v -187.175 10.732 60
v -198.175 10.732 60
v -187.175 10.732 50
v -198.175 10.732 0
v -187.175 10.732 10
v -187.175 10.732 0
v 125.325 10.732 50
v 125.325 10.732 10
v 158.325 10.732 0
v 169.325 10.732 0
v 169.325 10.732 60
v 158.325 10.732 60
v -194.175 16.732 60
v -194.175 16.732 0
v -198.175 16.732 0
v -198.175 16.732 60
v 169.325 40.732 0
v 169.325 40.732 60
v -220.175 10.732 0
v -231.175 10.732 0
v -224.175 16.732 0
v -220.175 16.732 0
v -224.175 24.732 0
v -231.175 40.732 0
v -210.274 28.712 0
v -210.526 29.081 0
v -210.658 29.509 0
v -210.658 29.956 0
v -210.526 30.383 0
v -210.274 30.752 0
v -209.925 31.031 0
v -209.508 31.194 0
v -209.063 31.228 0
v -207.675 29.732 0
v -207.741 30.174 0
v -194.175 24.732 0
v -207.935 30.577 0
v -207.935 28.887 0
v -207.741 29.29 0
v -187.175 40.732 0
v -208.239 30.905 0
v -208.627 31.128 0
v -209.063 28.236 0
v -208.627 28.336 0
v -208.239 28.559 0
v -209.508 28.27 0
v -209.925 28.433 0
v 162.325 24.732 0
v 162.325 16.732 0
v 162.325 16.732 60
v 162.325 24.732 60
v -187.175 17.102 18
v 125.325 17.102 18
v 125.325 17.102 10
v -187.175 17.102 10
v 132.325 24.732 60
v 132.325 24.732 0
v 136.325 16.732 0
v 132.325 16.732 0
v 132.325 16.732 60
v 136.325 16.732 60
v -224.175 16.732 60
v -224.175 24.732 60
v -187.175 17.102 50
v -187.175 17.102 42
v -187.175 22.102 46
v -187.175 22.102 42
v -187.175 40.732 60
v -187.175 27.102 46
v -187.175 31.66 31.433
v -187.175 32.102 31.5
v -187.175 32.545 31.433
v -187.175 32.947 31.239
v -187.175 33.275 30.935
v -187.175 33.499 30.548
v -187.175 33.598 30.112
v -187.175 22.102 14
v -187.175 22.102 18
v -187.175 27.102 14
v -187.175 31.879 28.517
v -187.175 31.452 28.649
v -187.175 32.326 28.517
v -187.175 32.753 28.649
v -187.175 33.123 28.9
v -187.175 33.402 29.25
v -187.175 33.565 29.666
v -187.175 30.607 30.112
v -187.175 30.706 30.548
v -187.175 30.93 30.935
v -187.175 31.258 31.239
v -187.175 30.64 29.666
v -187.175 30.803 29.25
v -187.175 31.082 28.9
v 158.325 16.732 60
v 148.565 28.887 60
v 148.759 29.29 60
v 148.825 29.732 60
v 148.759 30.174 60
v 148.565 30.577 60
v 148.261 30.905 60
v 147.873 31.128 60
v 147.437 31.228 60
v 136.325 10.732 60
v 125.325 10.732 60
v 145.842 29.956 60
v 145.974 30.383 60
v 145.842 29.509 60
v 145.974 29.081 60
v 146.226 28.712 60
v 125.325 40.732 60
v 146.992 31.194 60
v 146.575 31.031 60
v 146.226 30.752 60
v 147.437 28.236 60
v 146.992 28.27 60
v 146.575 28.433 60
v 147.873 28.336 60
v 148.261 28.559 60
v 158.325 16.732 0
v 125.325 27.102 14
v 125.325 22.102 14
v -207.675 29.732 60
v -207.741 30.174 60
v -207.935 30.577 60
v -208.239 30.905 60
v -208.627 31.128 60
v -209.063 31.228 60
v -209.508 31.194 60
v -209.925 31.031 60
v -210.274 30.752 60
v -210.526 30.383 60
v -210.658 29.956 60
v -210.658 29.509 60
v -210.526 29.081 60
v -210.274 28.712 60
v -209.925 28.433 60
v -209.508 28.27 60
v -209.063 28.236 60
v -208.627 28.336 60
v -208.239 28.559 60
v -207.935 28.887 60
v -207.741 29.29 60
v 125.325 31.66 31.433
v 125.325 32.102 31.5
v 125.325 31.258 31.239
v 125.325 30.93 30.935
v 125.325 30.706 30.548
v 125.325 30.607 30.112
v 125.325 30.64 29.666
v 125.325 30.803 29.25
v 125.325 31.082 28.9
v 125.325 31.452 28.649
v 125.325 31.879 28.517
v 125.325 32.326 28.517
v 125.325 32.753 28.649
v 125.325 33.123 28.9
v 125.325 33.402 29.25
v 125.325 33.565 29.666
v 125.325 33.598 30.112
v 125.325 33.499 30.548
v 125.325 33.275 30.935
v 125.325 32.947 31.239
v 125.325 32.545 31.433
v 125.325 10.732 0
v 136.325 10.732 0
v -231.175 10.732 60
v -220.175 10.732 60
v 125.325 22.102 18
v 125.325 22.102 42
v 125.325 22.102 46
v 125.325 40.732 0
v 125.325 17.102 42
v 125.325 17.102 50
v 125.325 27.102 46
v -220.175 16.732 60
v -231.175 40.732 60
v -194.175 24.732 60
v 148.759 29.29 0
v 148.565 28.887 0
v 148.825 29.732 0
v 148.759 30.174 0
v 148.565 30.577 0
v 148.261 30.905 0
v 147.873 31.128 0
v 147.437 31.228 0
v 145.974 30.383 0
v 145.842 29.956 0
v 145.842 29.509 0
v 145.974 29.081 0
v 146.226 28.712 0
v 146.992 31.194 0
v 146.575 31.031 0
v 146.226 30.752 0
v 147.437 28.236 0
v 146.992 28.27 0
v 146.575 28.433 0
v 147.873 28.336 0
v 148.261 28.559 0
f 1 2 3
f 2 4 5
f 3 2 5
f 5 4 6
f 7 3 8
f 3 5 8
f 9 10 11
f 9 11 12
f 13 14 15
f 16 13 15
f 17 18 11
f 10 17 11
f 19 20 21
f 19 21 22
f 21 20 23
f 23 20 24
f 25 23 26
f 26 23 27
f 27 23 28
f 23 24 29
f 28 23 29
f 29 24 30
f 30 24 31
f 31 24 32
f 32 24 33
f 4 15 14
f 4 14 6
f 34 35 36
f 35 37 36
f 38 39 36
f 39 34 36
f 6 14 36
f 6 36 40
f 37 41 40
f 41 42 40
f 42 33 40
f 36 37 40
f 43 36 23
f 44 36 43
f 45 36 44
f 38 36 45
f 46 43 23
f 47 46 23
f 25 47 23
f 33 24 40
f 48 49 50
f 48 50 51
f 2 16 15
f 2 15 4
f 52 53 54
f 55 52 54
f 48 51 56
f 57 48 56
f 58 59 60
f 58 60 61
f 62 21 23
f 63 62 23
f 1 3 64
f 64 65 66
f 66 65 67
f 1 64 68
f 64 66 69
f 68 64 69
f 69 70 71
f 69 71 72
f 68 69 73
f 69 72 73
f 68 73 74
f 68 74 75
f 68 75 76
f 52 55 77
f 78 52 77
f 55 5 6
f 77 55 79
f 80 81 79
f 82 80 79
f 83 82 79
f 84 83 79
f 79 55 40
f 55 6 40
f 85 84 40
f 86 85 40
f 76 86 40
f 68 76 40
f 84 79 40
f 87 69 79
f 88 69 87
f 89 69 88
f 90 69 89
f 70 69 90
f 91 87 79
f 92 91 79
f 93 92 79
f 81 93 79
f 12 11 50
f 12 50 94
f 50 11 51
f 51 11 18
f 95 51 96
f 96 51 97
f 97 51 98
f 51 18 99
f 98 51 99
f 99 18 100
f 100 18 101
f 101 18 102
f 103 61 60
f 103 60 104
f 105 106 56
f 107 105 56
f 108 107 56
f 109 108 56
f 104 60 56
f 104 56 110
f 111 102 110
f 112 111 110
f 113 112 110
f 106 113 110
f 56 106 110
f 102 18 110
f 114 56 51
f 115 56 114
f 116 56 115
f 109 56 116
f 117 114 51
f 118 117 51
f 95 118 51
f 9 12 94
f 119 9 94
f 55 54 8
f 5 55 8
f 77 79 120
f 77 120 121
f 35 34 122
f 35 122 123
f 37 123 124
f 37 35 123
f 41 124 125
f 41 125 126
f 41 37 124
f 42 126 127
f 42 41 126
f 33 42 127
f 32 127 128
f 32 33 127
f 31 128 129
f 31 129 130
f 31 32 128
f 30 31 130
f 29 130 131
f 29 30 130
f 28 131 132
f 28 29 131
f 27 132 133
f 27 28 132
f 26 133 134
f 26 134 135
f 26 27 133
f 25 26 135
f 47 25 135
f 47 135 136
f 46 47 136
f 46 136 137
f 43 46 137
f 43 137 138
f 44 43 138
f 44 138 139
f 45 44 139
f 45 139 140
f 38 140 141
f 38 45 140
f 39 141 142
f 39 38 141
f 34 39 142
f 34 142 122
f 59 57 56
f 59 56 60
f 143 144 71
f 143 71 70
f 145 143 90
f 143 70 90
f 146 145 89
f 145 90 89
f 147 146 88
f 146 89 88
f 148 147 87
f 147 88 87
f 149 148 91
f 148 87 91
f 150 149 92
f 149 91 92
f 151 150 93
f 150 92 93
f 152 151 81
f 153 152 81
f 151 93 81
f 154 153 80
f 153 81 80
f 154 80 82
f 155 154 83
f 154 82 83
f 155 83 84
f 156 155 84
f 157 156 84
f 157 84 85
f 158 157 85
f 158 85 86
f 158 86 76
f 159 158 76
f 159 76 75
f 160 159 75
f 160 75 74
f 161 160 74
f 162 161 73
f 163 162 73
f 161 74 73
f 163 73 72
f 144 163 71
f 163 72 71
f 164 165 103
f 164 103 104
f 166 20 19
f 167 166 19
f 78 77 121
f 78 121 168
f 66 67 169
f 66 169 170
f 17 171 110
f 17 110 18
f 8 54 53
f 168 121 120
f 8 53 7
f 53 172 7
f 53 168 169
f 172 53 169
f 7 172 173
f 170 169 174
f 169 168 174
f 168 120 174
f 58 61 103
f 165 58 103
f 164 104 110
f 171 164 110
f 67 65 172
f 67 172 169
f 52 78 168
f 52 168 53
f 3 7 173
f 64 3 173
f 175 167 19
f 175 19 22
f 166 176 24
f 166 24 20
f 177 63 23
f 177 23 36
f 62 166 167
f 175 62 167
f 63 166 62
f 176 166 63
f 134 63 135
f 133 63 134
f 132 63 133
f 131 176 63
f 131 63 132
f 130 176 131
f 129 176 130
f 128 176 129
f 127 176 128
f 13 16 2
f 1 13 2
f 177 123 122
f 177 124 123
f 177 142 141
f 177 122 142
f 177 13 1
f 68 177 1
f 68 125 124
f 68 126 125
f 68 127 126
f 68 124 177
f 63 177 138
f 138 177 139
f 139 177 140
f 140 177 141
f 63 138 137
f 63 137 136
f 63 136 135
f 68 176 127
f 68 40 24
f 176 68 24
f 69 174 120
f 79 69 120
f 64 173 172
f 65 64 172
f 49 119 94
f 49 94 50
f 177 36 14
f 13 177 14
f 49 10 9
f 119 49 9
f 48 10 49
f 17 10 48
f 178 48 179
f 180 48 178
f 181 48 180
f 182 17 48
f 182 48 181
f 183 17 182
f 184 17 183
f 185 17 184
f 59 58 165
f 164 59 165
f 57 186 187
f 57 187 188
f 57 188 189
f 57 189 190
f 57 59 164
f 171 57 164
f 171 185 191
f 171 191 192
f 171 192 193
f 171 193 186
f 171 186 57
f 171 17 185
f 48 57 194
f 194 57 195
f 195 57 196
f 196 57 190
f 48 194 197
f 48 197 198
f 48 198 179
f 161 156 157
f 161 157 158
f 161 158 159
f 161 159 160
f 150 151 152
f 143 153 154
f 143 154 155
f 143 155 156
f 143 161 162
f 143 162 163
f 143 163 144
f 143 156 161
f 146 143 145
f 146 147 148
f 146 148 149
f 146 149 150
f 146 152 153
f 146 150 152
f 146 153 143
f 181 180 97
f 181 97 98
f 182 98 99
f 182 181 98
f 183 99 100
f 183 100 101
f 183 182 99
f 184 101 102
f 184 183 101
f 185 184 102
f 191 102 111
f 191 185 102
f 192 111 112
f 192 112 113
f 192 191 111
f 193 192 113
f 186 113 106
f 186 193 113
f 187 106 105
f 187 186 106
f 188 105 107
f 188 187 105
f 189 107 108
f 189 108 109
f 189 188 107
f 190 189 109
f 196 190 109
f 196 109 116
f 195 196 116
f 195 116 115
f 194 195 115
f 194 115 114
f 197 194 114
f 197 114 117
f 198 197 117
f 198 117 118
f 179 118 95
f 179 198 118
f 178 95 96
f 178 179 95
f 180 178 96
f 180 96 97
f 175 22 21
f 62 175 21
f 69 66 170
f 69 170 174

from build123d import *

# Parameters (mm, degrees)
SKETCH_1_R        = 1.5
EXTRUDE_1_DEPTH   = 60
EXTRUDE_1_2_DEPTH = 60
SKETCH_2_R        = 1.5
EXTRUDE_2_DEPTH   = 312.5


with BuildPart() as part:
    # 草图1 → 凸台-拉伸1 (new body)
    with BuildSketch(Plane.XY):
        Polygon((-231.174600935, 10.732083355), (-220.174600935, 10.732083355), (-220.174600935, 16.732083355), (-224.174600935, 16.732083355), (-224.174600935, 24.732083355), (-194.174600935, 24.732083355), (-194.174600935, 16.732083355), (-198.174600935, 16.732083355), (-198.174600935, 10.732083355), (-187.174600935, 10.732083355), (-187.174600935, 40.732083355), (-231.174600935, 40.732083355), align=None)
        with Locations((-209.174600935, 29.732083355)):
            Circle(SKETCH_1_R, mode=Mode.SUBTRACT)
    extrude(amount=EXTRUDE_1_DEPTH)

    # 草图2 → 凸台-拉伸2 (add)
    with BuildSketch(Plane(origin=(-187.174600935, 0, 0), x_dir=(0, 0, -1), z_dir=(1, 0, 0))):
        with Locations(Location((-30, 32.102498143, 0), (0, 0, 180))):
            Circle(SKETCH_2_R)
        Polygon((-10, 10.732083355), (-50, 10.732083355), (-50, 17.102498143), (-42, 17.102498143), (-42, 22.102498143), (-46, 22.102498143), (-46, 27.102498143), (-14, 27.102498143), (-14, 22.102498143), (-18, 22.102498143), (-18, 17.102498143), (-10, 17.102498143), align=None)
    extrude(amount=EXTRUDE_2_DEPTH)


with BuildPart() as body_2:
    # 草图1 → Extrude 1 2 (new body)
    with BuildSketch(Plane.XY):
        Polygon((136.325399065, 16.732083355), (136.325399065, 10.732083355), (125.325399065, 10.732083355), (125.325399065, 40.732083355), (169.325399065, 40.732083355), (169.325399065, 10.732083355), (158.325399065, 10.732083355), (158.325399065, 16.732083355), (162.325399065, 16.732083355), (162.325399065, 24.732083355), (132.325399065, 24.732083355), (132.325399065, 16.732083355), align=None)
        with Locations((147.325399065, 29.732083355)):
            Circle(SKETCH_1_R, mode=Mode.SUBTRACT)
    extrude(amount=EXTRUDE_1_2_DEPTH)


solid = Compound([part.part, body_2.part])
